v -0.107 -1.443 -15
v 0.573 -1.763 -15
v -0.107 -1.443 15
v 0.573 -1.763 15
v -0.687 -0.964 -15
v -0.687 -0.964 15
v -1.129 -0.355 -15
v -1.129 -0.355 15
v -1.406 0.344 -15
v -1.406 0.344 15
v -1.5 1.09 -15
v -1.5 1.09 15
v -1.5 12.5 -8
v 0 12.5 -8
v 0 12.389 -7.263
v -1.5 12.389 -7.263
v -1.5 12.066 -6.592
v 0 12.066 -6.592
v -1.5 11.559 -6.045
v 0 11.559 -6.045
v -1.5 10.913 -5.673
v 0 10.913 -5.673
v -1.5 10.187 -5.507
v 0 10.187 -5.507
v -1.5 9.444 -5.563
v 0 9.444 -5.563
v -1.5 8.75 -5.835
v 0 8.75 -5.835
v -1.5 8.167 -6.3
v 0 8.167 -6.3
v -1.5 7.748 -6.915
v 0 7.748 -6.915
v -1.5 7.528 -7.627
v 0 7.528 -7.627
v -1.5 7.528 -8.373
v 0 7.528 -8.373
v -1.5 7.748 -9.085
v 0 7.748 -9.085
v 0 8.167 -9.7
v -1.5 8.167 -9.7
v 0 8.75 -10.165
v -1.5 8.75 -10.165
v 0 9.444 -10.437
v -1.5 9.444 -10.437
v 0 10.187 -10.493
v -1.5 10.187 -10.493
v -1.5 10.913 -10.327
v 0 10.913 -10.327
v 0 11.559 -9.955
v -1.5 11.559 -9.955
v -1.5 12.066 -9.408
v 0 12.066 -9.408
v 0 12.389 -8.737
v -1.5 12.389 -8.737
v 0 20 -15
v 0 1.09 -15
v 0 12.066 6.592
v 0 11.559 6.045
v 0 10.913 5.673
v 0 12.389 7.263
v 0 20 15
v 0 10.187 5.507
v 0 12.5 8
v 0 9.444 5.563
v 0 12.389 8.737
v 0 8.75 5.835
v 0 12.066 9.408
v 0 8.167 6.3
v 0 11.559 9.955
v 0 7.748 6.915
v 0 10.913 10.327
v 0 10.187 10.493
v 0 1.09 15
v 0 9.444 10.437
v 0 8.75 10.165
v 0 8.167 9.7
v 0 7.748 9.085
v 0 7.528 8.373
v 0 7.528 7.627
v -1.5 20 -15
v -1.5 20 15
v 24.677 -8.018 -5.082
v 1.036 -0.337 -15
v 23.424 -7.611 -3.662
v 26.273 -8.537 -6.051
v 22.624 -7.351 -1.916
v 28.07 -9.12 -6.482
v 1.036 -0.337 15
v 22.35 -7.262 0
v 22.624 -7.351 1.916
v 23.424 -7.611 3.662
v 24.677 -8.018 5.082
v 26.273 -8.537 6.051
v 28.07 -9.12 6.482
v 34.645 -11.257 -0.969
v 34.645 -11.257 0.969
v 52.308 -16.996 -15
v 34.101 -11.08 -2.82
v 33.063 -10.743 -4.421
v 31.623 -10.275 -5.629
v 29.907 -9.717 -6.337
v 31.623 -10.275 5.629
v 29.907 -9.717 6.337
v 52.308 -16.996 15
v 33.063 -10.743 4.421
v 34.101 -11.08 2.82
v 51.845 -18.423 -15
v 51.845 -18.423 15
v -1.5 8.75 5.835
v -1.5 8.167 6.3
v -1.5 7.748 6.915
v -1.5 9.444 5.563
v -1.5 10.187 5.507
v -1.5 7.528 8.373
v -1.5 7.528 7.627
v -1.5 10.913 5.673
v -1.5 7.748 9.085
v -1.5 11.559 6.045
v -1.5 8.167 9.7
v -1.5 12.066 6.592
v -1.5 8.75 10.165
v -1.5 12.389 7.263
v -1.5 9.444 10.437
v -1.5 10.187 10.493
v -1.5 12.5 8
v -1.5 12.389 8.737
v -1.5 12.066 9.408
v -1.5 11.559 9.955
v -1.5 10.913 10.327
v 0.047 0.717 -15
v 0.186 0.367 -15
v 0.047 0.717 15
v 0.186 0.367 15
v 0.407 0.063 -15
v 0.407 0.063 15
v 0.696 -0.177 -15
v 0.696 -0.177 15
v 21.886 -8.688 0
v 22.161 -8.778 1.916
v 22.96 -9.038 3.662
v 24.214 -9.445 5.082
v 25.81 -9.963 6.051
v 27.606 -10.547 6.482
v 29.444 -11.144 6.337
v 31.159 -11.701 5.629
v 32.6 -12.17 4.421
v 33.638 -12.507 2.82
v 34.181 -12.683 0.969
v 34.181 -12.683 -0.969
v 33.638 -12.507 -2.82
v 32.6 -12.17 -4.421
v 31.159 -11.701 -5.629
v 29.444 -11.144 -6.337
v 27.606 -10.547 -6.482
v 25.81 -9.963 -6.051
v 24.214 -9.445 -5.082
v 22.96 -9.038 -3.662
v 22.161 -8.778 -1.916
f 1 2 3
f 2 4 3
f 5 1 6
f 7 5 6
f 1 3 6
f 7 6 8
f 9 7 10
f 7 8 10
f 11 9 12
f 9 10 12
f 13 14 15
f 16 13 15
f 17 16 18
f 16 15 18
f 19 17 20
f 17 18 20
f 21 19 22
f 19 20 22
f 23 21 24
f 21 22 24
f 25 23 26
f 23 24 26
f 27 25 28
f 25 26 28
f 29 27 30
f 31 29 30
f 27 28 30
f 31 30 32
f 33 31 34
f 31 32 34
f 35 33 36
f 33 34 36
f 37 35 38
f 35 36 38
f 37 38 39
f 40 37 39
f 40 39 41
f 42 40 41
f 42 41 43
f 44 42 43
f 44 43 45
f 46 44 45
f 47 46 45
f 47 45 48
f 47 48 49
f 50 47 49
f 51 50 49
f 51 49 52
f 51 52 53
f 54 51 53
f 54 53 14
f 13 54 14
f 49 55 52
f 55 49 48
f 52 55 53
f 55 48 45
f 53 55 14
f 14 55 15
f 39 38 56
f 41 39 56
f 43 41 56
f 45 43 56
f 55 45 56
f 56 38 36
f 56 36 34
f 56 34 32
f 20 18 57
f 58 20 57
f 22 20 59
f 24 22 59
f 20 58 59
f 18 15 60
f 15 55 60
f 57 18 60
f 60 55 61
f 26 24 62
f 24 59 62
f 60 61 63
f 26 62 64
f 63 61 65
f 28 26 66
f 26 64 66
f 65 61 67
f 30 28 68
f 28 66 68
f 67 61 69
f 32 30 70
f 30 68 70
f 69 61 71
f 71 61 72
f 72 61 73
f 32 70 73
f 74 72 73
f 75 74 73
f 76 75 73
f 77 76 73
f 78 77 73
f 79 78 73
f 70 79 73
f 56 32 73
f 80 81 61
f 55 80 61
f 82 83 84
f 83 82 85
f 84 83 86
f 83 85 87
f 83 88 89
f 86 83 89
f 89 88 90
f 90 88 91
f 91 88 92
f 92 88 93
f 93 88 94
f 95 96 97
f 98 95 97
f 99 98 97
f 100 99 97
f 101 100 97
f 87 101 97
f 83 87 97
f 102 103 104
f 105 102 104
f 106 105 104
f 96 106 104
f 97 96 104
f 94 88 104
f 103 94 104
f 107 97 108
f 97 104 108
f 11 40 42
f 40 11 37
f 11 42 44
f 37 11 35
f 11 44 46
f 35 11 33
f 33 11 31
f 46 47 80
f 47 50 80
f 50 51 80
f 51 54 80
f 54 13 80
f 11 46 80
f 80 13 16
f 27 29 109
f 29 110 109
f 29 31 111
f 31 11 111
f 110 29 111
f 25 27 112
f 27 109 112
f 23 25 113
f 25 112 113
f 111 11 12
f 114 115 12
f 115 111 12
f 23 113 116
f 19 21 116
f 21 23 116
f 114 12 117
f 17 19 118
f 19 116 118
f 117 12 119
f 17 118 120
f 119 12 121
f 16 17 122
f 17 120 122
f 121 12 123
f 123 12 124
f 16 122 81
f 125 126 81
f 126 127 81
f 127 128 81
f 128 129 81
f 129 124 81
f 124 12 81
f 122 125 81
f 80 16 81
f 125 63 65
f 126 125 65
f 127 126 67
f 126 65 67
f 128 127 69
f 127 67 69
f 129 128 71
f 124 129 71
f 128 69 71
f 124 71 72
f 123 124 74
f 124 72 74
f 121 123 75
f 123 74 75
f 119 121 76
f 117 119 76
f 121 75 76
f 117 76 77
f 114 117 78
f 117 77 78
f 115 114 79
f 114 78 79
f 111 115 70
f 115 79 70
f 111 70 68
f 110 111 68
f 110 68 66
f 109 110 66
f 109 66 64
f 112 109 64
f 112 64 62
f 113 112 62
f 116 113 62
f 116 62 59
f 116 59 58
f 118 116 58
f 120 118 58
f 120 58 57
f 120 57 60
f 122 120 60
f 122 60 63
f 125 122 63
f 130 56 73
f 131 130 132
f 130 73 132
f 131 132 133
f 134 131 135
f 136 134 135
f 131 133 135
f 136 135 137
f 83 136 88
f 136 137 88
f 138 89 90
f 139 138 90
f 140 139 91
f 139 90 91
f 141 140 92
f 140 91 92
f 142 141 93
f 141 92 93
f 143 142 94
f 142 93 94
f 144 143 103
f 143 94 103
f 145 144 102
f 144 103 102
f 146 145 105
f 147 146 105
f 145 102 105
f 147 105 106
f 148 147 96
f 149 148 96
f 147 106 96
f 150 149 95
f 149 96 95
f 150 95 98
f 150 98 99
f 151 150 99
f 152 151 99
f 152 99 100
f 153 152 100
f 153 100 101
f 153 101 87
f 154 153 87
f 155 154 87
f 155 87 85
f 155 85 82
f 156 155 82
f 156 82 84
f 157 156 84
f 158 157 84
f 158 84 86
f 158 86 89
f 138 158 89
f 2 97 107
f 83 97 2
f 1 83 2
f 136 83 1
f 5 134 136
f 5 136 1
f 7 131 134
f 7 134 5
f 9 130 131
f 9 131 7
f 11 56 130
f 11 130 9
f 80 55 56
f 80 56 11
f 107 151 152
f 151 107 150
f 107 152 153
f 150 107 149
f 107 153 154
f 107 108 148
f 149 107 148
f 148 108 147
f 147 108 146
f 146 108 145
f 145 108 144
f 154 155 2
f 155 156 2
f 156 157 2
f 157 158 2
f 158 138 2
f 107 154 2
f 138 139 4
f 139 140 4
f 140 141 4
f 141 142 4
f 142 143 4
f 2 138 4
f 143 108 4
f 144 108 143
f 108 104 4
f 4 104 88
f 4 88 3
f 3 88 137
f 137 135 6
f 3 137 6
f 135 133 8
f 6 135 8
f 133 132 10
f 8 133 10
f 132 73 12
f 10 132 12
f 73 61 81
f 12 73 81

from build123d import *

# Parameters (mm, degrees)
SM_BASE_FLANGE_1_DEPTH = 15
SKETCH_6_R             = 2.5
CUT_EXTRUDE_664_DEPTH  = 10
SKETCH_7_R             = 6.5
CUT_EXTRUDE_2_DEPTH    = 10


# Sheet-metal steps are written as plain solids
with BuildPart() as part:
    # Sketch 1 → Базовая кромка1 (new, symmetric)
    with BuildSketch(Plane.XY):
        with BuildLine():
            Line((0, 20), (0, 1.089813792))
            ThreePointArc((0, 1.089813792), (0.286474508, 0.208135914), (1.036474508, -0.336770982))
            Line((1.036474508, -0.336770982), (52.308108396, -16.995934691))
            Line((52.308108396, -16.995934691), (51.844582905, -18.422519465))
            Line((51.844582905, -18.422519465), (0.572949017, -1.763355757))
            ThreePointArc((0.572949017, -1.763355757), (-0.927050983, -0.673541965), (-1.5, 1.089813792))
            Line((-1.5, 1.089813792), (-1.5, 20))
            Line((-1.5, 20), (0, 20))
        make_face()
    extrude(amount=SM_BASE_FLANGE_1_DEPTH, both=True)

    # Эскиз6 → Cut-Extrude 664 (cut)
    with BuildSketch(Plane(origin=(0, 0, 0), x_dir=(0, 0, -1), z_dir=(1, 0, 0))):
        with Locations(Location((-8, 10, 0), (0, 0, 90))):
            Circle(SKETCH_6_R)
        with Locations(Location((8, 10, 0), (0, 0, 90))):
            Circle(SKETCH_6_R)
    extrude(amount=-CUT_EXTRUDE_664_DEPTH, mode=Mode.SUBTRACT)

    # Эскиз7 → Вырез-Вытянуть2 (cut)
    with BuildSketch(Plane(origin=(0, 0, 0), x_dir=(0.9510565162951546, -0.3090169943749447, 0), z_dir=(0.3090169943749447, 0.9510565162951546, 0))):
        with Locations(Location((30, 0, 0), (0, 0, 180))):
            Circle(SKETCH_7_R)
    extrude(amount=-CUT_EXTRUDE_2_DEPTH, mode=Mode.SUBTRACT)


solid = part.part
